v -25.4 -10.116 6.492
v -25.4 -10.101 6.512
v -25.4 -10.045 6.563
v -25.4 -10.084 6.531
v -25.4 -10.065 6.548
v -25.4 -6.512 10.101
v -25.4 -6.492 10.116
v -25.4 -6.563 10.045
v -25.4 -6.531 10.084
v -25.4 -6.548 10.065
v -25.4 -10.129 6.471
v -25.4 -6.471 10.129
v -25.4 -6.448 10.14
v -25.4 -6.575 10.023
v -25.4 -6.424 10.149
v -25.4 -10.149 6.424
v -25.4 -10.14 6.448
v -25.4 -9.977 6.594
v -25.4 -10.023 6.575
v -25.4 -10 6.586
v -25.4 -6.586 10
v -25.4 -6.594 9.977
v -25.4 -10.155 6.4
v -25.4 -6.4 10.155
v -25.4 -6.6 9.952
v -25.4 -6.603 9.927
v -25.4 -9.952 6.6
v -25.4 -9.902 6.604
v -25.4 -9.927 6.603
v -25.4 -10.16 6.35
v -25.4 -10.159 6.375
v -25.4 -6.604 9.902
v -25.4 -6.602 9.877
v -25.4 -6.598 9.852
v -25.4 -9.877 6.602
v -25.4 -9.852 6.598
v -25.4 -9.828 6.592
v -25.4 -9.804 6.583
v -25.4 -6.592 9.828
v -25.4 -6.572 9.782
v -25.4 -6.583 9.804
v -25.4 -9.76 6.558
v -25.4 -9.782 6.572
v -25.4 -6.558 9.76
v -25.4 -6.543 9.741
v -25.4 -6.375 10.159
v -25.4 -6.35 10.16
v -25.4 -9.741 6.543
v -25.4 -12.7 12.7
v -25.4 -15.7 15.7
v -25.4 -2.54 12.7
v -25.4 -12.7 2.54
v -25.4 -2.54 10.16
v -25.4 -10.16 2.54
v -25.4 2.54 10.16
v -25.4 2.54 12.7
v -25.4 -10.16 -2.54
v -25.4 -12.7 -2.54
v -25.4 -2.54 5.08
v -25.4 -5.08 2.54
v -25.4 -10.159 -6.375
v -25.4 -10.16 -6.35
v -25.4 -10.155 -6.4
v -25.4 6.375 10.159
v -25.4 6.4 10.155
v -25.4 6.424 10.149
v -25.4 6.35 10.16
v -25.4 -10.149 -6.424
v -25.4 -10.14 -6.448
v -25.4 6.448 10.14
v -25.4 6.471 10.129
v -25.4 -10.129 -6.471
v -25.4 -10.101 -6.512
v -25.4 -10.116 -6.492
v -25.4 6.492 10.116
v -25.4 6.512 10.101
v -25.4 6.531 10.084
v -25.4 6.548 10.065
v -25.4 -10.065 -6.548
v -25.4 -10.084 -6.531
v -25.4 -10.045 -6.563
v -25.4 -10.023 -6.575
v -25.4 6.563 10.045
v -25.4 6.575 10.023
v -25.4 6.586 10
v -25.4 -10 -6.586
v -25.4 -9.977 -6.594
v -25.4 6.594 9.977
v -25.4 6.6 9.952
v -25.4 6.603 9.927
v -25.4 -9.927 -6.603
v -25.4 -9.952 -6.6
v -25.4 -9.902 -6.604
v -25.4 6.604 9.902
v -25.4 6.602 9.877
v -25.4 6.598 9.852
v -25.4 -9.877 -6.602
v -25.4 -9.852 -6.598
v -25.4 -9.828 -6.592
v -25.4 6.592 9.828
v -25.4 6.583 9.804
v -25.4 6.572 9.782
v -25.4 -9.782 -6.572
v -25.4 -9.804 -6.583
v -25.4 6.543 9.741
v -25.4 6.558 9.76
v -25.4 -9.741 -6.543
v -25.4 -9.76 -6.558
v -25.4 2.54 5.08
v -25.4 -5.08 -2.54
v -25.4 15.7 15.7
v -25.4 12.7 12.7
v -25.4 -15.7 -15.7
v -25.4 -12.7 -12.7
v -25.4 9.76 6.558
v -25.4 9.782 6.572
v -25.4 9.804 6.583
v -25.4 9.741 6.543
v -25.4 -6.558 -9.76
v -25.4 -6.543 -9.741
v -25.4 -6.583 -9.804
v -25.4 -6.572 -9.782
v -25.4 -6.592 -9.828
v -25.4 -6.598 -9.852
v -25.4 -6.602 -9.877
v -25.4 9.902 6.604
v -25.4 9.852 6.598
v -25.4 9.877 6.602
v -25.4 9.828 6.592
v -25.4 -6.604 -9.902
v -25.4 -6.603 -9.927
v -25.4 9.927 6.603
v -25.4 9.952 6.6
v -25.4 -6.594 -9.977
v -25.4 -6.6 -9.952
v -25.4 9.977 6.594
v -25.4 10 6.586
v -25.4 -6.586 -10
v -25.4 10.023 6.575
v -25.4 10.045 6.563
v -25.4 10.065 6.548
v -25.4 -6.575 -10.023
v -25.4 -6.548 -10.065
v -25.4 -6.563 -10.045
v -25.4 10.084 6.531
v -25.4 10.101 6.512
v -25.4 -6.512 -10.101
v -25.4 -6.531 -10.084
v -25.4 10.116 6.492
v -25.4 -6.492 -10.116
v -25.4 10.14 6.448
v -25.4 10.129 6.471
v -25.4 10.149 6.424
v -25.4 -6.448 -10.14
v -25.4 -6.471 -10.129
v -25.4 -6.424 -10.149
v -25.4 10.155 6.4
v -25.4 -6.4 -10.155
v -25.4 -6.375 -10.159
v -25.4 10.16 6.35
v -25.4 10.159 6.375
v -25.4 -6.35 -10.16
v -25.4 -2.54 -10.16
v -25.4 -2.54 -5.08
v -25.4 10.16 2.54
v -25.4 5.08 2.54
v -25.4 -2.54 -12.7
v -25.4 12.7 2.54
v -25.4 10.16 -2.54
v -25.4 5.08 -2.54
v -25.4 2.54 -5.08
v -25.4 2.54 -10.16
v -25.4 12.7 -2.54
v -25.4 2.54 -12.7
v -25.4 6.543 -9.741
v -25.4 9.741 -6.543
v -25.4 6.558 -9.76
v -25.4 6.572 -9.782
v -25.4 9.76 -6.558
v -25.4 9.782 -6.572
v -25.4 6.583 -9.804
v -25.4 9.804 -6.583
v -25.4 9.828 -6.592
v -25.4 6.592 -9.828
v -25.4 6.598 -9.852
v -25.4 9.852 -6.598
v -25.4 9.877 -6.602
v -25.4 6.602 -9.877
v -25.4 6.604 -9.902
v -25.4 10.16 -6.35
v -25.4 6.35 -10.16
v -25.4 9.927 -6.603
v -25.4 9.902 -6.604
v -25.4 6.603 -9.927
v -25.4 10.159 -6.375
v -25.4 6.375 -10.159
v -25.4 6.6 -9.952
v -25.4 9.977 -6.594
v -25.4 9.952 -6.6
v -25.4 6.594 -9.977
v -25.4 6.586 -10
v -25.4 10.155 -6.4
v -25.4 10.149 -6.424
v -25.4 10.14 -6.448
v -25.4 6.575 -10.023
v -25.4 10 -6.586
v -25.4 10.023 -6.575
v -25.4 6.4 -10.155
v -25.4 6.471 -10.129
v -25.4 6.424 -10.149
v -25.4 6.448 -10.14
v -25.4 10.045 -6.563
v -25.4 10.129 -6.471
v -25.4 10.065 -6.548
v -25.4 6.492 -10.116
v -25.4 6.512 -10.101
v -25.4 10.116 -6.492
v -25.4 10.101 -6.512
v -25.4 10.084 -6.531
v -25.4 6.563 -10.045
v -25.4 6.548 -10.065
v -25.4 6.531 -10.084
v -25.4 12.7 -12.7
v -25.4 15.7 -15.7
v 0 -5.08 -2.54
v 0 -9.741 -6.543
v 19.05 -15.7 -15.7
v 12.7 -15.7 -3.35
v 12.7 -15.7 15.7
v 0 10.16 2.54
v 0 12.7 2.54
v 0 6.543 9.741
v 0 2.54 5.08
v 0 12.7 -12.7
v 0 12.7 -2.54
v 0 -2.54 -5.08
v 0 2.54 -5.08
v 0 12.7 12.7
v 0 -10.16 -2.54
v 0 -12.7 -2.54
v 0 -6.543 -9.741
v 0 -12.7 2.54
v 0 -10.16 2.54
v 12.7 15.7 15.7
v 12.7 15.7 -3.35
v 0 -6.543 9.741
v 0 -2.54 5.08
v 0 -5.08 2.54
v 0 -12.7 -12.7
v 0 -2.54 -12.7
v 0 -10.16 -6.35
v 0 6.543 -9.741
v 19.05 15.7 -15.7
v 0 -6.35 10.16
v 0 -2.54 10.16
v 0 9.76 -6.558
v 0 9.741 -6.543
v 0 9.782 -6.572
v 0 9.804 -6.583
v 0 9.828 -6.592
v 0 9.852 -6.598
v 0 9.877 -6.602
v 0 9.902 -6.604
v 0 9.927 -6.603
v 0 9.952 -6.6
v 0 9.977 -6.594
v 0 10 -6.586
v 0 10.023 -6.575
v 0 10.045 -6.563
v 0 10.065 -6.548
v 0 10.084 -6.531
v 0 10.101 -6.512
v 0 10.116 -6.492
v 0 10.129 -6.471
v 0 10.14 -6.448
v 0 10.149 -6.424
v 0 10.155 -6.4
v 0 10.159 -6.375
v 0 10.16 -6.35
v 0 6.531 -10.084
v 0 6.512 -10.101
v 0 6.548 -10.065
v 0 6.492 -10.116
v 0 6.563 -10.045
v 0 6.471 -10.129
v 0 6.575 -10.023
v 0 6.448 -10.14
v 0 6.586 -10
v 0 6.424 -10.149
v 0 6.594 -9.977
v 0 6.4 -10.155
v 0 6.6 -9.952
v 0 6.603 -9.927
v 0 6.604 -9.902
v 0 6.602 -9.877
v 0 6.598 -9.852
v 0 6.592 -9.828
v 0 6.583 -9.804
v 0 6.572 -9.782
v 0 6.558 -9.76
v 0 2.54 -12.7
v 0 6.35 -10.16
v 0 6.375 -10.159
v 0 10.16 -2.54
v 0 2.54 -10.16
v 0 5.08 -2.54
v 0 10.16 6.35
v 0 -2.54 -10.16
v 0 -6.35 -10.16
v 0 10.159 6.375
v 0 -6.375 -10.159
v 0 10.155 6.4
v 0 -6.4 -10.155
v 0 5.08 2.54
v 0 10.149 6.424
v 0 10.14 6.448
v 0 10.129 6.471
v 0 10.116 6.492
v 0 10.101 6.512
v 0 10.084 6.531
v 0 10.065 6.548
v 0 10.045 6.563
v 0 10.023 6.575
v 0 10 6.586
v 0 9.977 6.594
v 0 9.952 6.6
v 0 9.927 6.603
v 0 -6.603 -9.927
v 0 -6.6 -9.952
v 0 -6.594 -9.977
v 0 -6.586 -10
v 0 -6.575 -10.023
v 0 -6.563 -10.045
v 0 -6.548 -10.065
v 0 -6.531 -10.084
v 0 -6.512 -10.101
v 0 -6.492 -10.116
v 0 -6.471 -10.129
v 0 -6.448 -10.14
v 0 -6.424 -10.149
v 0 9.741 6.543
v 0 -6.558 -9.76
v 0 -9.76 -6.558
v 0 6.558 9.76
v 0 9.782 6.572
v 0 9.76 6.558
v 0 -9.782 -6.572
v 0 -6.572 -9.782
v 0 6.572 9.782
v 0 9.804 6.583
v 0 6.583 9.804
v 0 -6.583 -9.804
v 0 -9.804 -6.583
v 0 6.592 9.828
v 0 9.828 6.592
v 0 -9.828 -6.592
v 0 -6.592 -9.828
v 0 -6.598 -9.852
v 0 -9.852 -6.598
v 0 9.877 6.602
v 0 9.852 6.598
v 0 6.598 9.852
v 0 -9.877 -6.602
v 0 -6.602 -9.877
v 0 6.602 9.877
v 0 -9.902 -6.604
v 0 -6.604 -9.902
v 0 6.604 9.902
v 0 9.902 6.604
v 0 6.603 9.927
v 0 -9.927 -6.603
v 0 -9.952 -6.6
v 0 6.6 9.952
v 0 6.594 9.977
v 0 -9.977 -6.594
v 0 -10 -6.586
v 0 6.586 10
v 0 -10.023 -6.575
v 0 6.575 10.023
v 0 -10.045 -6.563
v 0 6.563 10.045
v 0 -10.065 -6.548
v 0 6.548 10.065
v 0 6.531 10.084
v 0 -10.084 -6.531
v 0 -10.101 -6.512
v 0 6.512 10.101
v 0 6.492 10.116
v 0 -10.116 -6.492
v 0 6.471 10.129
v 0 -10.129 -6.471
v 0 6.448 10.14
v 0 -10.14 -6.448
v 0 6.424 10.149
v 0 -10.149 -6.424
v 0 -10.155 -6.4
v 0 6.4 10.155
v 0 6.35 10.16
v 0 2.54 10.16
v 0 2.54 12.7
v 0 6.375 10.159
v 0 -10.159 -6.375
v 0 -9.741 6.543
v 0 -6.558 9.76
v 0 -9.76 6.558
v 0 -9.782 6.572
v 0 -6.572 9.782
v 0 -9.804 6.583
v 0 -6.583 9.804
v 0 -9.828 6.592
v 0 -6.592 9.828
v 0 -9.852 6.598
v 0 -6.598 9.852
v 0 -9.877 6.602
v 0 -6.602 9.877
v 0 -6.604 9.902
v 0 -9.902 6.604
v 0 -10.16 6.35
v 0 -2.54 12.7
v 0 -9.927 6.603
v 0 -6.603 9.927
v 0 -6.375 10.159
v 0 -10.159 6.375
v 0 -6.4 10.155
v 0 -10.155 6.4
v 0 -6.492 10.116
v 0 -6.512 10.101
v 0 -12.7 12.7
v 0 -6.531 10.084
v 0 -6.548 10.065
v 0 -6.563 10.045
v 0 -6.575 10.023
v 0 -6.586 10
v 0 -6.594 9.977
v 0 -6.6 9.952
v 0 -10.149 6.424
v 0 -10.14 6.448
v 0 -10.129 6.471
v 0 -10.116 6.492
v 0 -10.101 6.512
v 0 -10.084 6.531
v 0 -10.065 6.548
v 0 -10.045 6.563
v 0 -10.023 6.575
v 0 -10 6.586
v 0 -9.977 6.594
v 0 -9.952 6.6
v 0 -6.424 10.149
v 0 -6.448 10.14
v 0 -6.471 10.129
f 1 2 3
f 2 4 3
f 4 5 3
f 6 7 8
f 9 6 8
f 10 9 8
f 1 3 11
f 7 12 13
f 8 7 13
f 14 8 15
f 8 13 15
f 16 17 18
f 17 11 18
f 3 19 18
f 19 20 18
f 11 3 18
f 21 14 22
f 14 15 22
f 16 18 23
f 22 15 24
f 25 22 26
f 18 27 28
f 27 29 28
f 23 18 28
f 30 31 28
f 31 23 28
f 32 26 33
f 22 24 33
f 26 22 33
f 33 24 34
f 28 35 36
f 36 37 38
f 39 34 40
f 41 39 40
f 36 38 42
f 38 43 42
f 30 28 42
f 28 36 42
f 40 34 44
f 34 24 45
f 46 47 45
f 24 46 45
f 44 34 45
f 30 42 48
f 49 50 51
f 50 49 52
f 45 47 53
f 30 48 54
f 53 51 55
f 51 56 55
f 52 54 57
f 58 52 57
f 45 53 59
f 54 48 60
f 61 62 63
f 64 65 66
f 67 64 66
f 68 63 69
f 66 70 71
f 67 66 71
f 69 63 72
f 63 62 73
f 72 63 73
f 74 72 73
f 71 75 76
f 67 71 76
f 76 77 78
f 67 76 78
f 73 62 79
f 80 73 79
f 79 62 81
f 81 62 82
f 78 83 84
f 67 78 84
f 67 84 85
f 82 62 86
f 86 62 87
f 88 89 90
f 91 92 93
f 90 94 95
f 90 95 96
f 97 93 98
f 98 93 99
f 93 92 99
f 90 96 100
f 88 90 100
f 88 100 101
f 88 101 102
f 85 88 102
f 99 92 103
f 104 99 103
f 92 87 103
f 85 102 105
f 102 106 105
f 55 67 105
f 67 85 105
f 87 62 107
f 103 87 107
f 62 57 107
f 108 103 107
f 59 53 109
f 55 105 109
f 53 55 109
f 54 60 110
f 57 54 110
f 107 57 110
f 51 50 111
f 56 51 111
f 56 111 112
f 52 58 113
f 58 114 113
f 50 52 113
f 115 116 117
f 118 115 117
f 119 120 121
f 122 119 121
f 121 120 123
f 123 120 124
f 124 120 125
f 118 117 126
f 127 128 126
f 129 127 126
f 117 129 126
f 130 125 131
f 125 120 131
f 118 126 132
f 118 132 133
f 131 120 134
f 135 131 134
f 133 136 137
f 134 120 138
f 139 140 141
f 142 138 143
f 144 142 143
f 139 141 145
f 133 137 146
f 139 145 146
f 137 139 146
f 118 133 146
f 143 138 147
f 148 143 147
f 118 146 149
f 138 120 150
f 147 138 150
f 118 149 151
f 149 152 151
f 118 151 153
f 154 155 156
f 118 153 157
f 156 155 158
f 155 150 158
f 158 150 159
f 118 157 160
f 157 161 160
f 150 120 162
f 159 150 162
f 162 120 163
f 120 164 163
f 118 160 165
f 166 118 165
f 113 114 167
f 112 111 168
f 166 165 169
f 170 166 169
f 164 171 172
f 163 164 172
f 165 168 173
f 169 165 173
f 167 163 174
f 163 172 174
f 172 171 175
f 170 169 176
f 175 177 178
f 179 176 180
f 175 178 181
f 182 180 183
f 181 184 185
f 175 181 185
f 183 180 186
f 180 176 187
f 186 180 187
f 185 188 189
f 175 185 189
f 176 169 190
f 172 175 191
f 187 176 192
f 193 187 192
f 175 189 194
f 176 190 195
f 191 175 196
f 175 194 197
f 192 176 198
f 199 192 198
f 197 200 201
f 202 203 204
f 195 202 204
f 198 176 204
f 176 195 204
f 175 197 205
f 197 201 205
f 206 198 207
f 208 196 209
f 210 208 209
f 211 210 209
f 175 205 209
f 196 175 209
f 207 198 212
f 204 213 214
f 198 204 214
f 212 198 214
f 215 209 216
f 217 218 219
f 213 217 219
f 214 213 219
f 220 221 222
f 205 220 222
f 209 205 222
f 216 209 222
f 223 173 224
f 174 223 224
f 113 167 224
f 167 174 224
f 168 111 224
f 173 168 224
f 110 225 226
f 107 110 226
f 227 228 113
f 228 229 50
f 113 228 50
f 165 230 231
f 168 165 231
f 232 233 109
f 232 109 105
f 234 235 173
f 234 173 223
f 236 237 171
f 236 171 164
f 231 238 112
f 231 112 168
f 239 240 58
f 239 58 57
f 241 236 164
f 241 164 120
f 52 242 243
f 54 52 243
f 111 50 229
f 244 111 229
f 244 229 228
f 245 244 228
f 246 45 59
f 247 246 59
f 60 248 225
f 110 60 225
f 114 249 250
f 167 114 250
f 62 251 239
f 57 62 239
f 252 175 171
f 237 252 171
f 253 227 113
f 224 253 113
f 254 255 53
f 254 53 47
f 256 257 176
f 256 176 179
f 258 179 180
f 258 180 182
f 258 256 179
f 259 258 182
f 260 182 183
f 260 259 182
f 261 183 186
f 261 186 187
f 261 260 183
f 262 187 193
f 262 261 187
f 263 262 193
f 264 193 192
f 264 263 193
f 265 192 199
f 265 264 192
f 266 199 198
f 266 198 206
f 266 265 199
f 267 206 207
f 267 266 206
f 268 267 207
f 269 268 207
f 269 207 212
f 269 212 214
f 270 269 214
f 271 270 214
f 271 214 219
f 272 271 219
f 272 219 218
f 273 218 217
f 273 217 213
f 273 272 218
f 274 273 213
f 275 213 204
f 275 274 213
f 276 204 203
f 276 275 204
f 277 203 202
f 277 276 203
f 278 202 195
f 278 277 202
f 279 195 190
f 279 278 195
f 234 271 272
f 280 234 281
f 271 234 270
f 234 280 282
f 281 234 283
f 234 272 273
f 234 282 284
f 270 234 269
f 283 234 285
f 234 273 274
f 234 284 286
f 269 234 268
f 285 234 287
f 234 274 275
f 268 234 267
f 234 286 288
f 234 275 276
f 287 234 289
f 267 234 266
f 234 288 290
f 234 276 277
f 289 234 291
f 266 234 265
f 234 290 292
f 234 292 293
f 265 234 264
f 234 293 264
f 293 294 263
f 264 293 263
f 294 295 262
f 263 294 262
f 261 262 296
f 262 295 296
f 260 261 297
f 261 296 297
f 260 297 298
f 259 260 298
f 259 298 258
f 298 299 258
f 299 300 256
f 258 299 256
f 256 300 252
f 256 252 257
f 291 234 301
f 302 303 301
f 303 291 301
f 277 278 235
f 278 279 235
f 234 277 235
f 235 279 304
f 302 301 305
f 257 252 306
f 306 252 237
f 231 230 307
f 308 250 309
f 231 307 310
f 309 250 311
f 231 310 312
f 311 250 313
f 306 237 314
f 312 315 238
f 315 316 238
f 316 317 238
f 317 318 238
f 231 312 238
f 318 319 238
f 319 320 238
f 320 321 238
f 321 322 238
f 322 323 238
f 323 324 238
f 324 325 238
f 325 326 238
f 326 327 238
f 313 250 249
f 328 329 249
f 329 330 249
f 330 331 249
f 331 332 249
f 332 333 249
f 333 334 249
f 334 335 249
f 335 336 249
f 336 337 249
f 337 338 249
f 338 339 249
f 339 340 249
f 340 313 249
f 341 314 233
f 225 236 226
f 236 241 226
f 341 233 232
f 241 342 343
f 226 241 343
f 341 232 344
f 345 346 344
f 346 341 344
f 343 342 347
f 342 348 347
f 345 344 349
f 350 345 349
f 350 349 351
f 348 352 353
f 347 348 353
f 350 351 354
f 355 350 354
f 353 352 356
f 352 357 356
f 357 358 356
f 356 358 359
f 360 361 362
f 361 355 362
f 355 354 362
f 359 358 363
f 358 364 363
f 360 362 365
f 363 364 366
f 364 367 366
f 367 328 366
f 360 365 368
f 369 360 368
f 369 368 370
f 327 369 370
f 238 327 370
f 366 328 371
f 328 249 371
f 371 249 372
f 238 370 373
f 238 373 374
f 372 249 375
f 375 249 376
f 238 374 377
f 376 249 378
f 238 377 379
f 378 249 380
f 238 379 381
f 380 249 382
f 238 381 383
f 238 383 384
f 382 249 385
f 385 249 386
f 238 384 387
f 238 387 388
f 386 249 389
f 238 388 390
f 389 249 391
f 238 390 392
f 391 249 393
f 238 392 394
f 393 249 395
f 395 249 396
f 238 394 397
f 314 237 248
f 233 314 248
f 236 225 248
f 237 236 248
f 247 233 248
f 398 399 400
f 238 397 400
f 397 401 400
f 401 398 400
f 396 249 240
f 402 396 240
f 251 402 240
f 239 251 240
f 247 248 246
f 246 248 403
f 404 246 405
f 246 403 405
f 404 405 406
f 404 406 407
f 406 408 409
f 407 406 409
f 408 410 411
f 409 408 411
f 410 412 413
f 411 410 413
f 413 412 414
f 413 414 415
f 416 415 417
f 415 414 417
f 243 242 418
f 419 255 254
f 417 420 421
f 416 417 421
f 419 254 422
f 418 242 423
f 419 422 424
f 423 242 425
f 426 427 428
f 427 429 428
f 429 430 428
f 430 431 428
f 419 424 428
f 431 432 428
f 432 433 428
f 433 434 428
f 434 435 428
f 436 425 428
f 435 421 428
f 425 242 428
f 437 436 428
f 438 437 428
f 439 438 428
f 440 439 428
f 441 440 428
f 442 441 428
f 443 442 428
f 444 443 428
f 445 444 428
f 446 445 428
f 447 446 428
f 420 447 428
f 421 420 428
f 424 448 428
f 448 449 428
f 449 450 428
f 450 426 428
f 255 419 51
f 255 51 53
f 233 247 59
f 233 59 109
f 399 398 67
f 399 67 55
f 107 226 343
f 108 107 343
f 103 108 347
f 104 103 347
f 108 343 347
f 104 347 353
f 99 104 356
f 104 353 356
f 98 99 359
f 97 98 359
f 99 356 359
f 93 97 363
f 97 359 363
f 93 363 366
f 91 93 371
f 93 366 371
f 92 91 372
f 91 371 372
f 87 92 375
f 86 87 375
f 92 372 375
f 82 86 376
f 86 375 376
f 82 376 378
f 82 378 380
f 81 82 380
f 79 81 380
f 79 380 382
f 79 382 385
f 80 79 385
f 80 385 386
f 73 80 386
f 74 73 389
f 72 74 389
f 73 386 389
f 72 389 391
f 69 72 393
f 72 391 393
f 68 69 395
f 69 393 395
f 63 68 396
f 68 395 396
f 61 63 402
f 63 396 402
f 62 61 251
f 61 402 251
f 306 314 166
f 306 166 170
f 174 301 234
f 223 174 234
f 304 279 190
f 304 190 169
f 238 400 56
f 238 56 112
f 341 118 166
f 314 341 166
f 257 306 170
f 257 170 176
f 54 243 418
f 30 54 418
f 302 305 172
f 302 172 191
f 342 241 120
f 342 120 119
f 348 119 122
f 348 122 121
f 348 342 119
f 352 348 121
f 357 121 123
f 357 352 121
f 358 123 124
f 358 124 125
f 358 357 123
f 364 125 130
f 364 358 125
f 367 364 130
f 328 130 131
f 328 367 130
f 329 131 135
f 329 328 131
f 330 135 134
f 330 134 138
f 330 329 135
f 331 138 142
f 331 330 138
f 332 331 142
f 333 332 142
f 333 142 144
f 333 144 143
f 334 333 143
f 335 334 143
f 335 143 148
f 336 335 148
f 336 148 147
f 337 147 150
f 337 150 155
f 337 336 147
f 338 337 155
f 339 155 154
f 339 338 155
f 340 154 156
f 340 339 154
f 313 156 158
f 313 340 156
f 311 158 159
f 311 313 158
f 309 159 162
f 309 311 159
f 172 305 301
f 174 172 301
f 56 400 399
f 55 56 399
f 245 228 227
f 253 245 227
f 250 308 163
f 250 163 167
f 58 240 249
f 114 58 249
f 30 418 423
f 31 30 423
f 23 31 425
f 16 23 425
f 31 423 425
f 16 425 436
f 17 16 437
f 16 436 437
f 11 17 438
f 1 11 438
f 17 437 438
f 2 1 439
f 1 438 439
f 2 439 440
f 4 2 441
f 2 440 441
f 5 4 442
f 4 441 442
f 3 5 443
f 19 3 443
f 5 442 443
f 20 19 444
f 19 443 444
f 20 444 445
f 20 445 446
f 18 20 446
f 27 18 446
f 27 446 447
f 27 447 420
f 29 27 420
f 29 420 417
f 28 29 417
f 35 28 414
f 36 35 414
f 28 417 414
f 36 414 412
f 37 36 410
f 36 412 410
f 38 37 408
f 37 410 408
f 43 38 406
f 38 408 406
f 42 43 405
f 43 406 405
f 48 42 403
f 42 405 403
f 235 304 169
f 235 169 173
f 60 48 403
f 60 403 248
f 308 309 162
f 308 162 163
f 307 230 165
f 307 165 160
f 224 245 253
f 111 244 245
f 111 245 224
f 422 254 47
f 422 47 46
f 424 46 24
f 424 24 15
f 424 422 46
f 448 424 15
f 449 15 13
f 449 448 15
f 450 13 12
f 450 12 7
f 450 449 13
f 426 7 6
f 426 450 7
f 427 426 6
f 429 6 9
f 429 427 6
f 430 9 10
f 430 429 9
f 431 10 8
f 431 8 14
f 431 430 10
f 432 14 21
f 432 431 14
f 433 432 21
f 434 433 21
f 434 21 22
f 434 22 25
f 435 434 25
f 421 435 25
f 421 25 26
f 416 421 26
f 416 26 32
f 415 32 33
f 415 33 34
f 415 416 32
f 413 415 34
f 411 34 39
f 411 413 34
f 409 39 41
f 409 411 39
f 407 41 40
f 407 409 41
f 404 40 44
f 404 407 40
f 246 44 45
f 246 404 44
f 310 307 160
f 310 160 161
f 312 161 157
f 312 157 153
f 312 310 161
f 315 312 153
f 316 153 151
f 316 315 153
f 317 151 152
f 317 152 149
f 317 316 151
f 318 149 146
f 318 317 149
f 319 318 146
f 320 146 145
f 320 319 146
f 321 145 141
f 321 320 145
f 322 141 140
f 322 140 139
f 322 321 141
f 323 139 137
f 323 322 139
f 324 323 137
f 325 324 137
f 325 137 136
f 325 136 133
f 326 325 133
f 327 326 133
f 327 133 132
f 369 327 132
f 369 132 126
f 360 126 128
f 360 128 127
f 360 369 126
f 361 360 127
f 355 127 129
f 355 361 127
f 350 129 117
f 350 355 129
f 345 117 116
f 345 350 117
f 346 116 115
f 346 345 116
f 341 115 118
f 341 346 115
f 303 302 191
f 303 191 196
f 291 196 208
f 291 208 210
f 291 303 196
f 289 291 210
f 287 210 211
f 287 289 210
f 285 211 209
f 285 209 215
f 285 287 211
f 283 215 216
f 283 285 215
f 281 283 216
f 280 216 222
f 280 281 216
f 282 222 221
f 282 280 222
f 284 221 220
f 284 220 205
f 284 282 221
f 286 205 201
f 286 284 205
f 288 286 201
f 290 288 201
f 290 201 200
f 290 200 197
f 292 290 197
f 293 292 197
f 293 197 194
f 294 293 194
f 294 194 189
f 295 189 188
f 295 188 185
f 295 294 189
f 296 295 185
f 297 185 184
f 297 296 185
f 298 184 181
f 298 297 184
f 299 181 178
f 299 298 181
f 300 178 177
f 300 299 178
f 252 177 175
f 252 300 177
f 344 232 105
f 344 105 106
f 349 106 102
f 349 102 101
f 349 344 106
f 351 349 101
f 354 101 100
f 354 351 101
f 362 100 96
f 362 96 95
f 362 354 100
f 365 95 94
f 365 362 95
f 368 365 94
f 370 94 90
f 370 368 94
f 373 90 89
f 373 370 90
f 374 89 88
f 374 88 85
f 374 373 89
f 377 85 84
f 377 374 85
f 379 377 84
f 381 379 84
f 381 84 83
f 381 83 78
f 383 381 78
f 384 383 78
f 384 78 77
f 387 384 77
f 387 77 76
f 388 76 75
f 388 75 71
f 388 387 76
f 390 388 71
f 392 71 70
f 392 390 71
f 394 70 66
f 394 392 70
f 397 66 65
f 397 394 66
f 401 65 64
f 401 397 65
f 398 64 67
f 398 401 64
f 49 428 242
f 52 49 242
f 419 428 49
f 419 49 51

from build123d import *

# Parameters (mm, degrees)
SKETCH10_W          = 2.54
SKETCH10_H          = 5.08
SKETCH10_W_2        = 5.08
SKETCH10_H_2        = 2.54
BOSS_EXTRUDE3_DEPTH = 25.4
SKETCH11_W          = 31.4
SKETCH11_H          = 31.4
SKETCH11_W_2        = 25.4
SKETCH11_H_2        = 25.4
BOSS_EXTRUDE5_DEPTH = 25.4
BOSS_EXTRUDE6_DEPTH = 31.4


with BuildPart() as part:
    # Sketch10 → Boss-Extrude3 (new body)
    with BuildSketch(Plane(origin=(0, 0, 0), x_dir=(0, 0, -1), z_dir=(1, 0, 0))):
        with Locations((-11.43, 0)):
            Rectangle(SKETCH10_W, SKETCH10_H)
        with BuildLine():
            Line((-5.08, 2.54), (-9.740509205, 6.542688341))
            ThreePointArc((-9.740509205, 6.542688341), (-10.012022021, 6.580814495), (-10.16, 6.35))
            Line((-10.16, 6.35), (-10.16, -6.35))
            ThreePointArc((-10.16, -6.35), (-10.012022021, -6.580814495), (-9.740509205, -6.542688341))
            Line((-9.740509205, -6.542688341), (-5.08, -2.54))
            Line((-5.08, -2.54), (-5.08, 2.54))
        make_face()
        with BuildLine():
            Line((6.35, 10.16), (-6.35, 10.16))
            ThreePointArc((-6.35, 10.16), (-6.580814495, 10.012022021), (-6.542688341, 9.740509205))
            Line((-6.542688341, 9.740509205), (-2.54, 5.08))
            Line((-2.54, 5.08), (2.54, 5.08))
            Line((2.54, 5.08), (6.542688341, 9.740509205))
            ThreePointArc((6.542688341, 9.740509205), (6.580814495, 10.012022021), (6.35, 10.16))
        make_face()
        with Locations((0, 11.43)):
            Rectangle(SKETCH10_W_2, SKETCH10_H_2)
        with BuildLine():
            ThreePointArc((6.542688341, -9.740509205), (6.580814495, -10.012022021), (6.35, -10.16))
            Line((6.35, -10.16), (-6.35, -10.16))
            ThreePointArc((-6.35, -10.16), (-6.580814495, -10.012022021), (-6.542688341, -9.740509205))
            Line((-6.542688341, -9.740509205), (-2.54, -5.08))
            Line((-2.54, -5.08), (2.54, -5.08))
            Line((2.54, -5.08), (6.542688341, -9.740509205))
        make_face()
        with Locations((0, -11.43)):
            Rectangle(SKETCH10_W_2, SKETCH10_H_2)
        with BuildLine():
            Line((5.08, 2.54), (5.08, -2.54))
            Line((5.08, -2.54), (9.740509205, -6.542688341))
            ThreePointArc((9.740509205, -6.542688341), (10.012022021, -6.580814495), (10.16, -6.35))
            Line((10.16, -6.35), (10.16, -2.54))
            Line((10.16, -2.54), (10.16, 2.54))
            Line((10.16, 2.54), (10.16, 6.35))
            ThreePointArc((10.16, 6.35), (10.012022021, 6.580814495), (9.740509205, 6.542688341))
            Line((9.740509205, 6.542688341), (5.08, 2.54))
        make_face()
        with Locations((11.43, 0)):
            Rectangle(SKETCH10_W, SKETCH10_H)
    extrude(amount=-BOSS_EXTRUDE3_DEPTH)

    # Sketch11 → Boss-Extrude5 (add, through all)
    with BuildSketch(Plane(origin=(0, 0, 0), x_dir=(0, 0, -1), z_dir=(1, 0, 0))):
        Rectangle(SKETCH11_W, SKETCH11_H)
        Rectangle(SKETCH11_W_2, SKETCH11_H_2, mode=Mode.SUBTRACT)
    extrude(amount=-BOSS_EXTRUDE5_DEPTH)

    # Sketch13 → Boss-Extrude6 (add, through all)
    with BuildSketch(Plane.XZ.offset(15.7)):
        Polygon((0, 15.7), (12.7, 15.7), (12.7, -3.35), (19.05, -15.7), (0, -15.7), align=None)
    extrude(amount=-BOSS_EXTRUDE6_DEPTH)


solid = part.part
